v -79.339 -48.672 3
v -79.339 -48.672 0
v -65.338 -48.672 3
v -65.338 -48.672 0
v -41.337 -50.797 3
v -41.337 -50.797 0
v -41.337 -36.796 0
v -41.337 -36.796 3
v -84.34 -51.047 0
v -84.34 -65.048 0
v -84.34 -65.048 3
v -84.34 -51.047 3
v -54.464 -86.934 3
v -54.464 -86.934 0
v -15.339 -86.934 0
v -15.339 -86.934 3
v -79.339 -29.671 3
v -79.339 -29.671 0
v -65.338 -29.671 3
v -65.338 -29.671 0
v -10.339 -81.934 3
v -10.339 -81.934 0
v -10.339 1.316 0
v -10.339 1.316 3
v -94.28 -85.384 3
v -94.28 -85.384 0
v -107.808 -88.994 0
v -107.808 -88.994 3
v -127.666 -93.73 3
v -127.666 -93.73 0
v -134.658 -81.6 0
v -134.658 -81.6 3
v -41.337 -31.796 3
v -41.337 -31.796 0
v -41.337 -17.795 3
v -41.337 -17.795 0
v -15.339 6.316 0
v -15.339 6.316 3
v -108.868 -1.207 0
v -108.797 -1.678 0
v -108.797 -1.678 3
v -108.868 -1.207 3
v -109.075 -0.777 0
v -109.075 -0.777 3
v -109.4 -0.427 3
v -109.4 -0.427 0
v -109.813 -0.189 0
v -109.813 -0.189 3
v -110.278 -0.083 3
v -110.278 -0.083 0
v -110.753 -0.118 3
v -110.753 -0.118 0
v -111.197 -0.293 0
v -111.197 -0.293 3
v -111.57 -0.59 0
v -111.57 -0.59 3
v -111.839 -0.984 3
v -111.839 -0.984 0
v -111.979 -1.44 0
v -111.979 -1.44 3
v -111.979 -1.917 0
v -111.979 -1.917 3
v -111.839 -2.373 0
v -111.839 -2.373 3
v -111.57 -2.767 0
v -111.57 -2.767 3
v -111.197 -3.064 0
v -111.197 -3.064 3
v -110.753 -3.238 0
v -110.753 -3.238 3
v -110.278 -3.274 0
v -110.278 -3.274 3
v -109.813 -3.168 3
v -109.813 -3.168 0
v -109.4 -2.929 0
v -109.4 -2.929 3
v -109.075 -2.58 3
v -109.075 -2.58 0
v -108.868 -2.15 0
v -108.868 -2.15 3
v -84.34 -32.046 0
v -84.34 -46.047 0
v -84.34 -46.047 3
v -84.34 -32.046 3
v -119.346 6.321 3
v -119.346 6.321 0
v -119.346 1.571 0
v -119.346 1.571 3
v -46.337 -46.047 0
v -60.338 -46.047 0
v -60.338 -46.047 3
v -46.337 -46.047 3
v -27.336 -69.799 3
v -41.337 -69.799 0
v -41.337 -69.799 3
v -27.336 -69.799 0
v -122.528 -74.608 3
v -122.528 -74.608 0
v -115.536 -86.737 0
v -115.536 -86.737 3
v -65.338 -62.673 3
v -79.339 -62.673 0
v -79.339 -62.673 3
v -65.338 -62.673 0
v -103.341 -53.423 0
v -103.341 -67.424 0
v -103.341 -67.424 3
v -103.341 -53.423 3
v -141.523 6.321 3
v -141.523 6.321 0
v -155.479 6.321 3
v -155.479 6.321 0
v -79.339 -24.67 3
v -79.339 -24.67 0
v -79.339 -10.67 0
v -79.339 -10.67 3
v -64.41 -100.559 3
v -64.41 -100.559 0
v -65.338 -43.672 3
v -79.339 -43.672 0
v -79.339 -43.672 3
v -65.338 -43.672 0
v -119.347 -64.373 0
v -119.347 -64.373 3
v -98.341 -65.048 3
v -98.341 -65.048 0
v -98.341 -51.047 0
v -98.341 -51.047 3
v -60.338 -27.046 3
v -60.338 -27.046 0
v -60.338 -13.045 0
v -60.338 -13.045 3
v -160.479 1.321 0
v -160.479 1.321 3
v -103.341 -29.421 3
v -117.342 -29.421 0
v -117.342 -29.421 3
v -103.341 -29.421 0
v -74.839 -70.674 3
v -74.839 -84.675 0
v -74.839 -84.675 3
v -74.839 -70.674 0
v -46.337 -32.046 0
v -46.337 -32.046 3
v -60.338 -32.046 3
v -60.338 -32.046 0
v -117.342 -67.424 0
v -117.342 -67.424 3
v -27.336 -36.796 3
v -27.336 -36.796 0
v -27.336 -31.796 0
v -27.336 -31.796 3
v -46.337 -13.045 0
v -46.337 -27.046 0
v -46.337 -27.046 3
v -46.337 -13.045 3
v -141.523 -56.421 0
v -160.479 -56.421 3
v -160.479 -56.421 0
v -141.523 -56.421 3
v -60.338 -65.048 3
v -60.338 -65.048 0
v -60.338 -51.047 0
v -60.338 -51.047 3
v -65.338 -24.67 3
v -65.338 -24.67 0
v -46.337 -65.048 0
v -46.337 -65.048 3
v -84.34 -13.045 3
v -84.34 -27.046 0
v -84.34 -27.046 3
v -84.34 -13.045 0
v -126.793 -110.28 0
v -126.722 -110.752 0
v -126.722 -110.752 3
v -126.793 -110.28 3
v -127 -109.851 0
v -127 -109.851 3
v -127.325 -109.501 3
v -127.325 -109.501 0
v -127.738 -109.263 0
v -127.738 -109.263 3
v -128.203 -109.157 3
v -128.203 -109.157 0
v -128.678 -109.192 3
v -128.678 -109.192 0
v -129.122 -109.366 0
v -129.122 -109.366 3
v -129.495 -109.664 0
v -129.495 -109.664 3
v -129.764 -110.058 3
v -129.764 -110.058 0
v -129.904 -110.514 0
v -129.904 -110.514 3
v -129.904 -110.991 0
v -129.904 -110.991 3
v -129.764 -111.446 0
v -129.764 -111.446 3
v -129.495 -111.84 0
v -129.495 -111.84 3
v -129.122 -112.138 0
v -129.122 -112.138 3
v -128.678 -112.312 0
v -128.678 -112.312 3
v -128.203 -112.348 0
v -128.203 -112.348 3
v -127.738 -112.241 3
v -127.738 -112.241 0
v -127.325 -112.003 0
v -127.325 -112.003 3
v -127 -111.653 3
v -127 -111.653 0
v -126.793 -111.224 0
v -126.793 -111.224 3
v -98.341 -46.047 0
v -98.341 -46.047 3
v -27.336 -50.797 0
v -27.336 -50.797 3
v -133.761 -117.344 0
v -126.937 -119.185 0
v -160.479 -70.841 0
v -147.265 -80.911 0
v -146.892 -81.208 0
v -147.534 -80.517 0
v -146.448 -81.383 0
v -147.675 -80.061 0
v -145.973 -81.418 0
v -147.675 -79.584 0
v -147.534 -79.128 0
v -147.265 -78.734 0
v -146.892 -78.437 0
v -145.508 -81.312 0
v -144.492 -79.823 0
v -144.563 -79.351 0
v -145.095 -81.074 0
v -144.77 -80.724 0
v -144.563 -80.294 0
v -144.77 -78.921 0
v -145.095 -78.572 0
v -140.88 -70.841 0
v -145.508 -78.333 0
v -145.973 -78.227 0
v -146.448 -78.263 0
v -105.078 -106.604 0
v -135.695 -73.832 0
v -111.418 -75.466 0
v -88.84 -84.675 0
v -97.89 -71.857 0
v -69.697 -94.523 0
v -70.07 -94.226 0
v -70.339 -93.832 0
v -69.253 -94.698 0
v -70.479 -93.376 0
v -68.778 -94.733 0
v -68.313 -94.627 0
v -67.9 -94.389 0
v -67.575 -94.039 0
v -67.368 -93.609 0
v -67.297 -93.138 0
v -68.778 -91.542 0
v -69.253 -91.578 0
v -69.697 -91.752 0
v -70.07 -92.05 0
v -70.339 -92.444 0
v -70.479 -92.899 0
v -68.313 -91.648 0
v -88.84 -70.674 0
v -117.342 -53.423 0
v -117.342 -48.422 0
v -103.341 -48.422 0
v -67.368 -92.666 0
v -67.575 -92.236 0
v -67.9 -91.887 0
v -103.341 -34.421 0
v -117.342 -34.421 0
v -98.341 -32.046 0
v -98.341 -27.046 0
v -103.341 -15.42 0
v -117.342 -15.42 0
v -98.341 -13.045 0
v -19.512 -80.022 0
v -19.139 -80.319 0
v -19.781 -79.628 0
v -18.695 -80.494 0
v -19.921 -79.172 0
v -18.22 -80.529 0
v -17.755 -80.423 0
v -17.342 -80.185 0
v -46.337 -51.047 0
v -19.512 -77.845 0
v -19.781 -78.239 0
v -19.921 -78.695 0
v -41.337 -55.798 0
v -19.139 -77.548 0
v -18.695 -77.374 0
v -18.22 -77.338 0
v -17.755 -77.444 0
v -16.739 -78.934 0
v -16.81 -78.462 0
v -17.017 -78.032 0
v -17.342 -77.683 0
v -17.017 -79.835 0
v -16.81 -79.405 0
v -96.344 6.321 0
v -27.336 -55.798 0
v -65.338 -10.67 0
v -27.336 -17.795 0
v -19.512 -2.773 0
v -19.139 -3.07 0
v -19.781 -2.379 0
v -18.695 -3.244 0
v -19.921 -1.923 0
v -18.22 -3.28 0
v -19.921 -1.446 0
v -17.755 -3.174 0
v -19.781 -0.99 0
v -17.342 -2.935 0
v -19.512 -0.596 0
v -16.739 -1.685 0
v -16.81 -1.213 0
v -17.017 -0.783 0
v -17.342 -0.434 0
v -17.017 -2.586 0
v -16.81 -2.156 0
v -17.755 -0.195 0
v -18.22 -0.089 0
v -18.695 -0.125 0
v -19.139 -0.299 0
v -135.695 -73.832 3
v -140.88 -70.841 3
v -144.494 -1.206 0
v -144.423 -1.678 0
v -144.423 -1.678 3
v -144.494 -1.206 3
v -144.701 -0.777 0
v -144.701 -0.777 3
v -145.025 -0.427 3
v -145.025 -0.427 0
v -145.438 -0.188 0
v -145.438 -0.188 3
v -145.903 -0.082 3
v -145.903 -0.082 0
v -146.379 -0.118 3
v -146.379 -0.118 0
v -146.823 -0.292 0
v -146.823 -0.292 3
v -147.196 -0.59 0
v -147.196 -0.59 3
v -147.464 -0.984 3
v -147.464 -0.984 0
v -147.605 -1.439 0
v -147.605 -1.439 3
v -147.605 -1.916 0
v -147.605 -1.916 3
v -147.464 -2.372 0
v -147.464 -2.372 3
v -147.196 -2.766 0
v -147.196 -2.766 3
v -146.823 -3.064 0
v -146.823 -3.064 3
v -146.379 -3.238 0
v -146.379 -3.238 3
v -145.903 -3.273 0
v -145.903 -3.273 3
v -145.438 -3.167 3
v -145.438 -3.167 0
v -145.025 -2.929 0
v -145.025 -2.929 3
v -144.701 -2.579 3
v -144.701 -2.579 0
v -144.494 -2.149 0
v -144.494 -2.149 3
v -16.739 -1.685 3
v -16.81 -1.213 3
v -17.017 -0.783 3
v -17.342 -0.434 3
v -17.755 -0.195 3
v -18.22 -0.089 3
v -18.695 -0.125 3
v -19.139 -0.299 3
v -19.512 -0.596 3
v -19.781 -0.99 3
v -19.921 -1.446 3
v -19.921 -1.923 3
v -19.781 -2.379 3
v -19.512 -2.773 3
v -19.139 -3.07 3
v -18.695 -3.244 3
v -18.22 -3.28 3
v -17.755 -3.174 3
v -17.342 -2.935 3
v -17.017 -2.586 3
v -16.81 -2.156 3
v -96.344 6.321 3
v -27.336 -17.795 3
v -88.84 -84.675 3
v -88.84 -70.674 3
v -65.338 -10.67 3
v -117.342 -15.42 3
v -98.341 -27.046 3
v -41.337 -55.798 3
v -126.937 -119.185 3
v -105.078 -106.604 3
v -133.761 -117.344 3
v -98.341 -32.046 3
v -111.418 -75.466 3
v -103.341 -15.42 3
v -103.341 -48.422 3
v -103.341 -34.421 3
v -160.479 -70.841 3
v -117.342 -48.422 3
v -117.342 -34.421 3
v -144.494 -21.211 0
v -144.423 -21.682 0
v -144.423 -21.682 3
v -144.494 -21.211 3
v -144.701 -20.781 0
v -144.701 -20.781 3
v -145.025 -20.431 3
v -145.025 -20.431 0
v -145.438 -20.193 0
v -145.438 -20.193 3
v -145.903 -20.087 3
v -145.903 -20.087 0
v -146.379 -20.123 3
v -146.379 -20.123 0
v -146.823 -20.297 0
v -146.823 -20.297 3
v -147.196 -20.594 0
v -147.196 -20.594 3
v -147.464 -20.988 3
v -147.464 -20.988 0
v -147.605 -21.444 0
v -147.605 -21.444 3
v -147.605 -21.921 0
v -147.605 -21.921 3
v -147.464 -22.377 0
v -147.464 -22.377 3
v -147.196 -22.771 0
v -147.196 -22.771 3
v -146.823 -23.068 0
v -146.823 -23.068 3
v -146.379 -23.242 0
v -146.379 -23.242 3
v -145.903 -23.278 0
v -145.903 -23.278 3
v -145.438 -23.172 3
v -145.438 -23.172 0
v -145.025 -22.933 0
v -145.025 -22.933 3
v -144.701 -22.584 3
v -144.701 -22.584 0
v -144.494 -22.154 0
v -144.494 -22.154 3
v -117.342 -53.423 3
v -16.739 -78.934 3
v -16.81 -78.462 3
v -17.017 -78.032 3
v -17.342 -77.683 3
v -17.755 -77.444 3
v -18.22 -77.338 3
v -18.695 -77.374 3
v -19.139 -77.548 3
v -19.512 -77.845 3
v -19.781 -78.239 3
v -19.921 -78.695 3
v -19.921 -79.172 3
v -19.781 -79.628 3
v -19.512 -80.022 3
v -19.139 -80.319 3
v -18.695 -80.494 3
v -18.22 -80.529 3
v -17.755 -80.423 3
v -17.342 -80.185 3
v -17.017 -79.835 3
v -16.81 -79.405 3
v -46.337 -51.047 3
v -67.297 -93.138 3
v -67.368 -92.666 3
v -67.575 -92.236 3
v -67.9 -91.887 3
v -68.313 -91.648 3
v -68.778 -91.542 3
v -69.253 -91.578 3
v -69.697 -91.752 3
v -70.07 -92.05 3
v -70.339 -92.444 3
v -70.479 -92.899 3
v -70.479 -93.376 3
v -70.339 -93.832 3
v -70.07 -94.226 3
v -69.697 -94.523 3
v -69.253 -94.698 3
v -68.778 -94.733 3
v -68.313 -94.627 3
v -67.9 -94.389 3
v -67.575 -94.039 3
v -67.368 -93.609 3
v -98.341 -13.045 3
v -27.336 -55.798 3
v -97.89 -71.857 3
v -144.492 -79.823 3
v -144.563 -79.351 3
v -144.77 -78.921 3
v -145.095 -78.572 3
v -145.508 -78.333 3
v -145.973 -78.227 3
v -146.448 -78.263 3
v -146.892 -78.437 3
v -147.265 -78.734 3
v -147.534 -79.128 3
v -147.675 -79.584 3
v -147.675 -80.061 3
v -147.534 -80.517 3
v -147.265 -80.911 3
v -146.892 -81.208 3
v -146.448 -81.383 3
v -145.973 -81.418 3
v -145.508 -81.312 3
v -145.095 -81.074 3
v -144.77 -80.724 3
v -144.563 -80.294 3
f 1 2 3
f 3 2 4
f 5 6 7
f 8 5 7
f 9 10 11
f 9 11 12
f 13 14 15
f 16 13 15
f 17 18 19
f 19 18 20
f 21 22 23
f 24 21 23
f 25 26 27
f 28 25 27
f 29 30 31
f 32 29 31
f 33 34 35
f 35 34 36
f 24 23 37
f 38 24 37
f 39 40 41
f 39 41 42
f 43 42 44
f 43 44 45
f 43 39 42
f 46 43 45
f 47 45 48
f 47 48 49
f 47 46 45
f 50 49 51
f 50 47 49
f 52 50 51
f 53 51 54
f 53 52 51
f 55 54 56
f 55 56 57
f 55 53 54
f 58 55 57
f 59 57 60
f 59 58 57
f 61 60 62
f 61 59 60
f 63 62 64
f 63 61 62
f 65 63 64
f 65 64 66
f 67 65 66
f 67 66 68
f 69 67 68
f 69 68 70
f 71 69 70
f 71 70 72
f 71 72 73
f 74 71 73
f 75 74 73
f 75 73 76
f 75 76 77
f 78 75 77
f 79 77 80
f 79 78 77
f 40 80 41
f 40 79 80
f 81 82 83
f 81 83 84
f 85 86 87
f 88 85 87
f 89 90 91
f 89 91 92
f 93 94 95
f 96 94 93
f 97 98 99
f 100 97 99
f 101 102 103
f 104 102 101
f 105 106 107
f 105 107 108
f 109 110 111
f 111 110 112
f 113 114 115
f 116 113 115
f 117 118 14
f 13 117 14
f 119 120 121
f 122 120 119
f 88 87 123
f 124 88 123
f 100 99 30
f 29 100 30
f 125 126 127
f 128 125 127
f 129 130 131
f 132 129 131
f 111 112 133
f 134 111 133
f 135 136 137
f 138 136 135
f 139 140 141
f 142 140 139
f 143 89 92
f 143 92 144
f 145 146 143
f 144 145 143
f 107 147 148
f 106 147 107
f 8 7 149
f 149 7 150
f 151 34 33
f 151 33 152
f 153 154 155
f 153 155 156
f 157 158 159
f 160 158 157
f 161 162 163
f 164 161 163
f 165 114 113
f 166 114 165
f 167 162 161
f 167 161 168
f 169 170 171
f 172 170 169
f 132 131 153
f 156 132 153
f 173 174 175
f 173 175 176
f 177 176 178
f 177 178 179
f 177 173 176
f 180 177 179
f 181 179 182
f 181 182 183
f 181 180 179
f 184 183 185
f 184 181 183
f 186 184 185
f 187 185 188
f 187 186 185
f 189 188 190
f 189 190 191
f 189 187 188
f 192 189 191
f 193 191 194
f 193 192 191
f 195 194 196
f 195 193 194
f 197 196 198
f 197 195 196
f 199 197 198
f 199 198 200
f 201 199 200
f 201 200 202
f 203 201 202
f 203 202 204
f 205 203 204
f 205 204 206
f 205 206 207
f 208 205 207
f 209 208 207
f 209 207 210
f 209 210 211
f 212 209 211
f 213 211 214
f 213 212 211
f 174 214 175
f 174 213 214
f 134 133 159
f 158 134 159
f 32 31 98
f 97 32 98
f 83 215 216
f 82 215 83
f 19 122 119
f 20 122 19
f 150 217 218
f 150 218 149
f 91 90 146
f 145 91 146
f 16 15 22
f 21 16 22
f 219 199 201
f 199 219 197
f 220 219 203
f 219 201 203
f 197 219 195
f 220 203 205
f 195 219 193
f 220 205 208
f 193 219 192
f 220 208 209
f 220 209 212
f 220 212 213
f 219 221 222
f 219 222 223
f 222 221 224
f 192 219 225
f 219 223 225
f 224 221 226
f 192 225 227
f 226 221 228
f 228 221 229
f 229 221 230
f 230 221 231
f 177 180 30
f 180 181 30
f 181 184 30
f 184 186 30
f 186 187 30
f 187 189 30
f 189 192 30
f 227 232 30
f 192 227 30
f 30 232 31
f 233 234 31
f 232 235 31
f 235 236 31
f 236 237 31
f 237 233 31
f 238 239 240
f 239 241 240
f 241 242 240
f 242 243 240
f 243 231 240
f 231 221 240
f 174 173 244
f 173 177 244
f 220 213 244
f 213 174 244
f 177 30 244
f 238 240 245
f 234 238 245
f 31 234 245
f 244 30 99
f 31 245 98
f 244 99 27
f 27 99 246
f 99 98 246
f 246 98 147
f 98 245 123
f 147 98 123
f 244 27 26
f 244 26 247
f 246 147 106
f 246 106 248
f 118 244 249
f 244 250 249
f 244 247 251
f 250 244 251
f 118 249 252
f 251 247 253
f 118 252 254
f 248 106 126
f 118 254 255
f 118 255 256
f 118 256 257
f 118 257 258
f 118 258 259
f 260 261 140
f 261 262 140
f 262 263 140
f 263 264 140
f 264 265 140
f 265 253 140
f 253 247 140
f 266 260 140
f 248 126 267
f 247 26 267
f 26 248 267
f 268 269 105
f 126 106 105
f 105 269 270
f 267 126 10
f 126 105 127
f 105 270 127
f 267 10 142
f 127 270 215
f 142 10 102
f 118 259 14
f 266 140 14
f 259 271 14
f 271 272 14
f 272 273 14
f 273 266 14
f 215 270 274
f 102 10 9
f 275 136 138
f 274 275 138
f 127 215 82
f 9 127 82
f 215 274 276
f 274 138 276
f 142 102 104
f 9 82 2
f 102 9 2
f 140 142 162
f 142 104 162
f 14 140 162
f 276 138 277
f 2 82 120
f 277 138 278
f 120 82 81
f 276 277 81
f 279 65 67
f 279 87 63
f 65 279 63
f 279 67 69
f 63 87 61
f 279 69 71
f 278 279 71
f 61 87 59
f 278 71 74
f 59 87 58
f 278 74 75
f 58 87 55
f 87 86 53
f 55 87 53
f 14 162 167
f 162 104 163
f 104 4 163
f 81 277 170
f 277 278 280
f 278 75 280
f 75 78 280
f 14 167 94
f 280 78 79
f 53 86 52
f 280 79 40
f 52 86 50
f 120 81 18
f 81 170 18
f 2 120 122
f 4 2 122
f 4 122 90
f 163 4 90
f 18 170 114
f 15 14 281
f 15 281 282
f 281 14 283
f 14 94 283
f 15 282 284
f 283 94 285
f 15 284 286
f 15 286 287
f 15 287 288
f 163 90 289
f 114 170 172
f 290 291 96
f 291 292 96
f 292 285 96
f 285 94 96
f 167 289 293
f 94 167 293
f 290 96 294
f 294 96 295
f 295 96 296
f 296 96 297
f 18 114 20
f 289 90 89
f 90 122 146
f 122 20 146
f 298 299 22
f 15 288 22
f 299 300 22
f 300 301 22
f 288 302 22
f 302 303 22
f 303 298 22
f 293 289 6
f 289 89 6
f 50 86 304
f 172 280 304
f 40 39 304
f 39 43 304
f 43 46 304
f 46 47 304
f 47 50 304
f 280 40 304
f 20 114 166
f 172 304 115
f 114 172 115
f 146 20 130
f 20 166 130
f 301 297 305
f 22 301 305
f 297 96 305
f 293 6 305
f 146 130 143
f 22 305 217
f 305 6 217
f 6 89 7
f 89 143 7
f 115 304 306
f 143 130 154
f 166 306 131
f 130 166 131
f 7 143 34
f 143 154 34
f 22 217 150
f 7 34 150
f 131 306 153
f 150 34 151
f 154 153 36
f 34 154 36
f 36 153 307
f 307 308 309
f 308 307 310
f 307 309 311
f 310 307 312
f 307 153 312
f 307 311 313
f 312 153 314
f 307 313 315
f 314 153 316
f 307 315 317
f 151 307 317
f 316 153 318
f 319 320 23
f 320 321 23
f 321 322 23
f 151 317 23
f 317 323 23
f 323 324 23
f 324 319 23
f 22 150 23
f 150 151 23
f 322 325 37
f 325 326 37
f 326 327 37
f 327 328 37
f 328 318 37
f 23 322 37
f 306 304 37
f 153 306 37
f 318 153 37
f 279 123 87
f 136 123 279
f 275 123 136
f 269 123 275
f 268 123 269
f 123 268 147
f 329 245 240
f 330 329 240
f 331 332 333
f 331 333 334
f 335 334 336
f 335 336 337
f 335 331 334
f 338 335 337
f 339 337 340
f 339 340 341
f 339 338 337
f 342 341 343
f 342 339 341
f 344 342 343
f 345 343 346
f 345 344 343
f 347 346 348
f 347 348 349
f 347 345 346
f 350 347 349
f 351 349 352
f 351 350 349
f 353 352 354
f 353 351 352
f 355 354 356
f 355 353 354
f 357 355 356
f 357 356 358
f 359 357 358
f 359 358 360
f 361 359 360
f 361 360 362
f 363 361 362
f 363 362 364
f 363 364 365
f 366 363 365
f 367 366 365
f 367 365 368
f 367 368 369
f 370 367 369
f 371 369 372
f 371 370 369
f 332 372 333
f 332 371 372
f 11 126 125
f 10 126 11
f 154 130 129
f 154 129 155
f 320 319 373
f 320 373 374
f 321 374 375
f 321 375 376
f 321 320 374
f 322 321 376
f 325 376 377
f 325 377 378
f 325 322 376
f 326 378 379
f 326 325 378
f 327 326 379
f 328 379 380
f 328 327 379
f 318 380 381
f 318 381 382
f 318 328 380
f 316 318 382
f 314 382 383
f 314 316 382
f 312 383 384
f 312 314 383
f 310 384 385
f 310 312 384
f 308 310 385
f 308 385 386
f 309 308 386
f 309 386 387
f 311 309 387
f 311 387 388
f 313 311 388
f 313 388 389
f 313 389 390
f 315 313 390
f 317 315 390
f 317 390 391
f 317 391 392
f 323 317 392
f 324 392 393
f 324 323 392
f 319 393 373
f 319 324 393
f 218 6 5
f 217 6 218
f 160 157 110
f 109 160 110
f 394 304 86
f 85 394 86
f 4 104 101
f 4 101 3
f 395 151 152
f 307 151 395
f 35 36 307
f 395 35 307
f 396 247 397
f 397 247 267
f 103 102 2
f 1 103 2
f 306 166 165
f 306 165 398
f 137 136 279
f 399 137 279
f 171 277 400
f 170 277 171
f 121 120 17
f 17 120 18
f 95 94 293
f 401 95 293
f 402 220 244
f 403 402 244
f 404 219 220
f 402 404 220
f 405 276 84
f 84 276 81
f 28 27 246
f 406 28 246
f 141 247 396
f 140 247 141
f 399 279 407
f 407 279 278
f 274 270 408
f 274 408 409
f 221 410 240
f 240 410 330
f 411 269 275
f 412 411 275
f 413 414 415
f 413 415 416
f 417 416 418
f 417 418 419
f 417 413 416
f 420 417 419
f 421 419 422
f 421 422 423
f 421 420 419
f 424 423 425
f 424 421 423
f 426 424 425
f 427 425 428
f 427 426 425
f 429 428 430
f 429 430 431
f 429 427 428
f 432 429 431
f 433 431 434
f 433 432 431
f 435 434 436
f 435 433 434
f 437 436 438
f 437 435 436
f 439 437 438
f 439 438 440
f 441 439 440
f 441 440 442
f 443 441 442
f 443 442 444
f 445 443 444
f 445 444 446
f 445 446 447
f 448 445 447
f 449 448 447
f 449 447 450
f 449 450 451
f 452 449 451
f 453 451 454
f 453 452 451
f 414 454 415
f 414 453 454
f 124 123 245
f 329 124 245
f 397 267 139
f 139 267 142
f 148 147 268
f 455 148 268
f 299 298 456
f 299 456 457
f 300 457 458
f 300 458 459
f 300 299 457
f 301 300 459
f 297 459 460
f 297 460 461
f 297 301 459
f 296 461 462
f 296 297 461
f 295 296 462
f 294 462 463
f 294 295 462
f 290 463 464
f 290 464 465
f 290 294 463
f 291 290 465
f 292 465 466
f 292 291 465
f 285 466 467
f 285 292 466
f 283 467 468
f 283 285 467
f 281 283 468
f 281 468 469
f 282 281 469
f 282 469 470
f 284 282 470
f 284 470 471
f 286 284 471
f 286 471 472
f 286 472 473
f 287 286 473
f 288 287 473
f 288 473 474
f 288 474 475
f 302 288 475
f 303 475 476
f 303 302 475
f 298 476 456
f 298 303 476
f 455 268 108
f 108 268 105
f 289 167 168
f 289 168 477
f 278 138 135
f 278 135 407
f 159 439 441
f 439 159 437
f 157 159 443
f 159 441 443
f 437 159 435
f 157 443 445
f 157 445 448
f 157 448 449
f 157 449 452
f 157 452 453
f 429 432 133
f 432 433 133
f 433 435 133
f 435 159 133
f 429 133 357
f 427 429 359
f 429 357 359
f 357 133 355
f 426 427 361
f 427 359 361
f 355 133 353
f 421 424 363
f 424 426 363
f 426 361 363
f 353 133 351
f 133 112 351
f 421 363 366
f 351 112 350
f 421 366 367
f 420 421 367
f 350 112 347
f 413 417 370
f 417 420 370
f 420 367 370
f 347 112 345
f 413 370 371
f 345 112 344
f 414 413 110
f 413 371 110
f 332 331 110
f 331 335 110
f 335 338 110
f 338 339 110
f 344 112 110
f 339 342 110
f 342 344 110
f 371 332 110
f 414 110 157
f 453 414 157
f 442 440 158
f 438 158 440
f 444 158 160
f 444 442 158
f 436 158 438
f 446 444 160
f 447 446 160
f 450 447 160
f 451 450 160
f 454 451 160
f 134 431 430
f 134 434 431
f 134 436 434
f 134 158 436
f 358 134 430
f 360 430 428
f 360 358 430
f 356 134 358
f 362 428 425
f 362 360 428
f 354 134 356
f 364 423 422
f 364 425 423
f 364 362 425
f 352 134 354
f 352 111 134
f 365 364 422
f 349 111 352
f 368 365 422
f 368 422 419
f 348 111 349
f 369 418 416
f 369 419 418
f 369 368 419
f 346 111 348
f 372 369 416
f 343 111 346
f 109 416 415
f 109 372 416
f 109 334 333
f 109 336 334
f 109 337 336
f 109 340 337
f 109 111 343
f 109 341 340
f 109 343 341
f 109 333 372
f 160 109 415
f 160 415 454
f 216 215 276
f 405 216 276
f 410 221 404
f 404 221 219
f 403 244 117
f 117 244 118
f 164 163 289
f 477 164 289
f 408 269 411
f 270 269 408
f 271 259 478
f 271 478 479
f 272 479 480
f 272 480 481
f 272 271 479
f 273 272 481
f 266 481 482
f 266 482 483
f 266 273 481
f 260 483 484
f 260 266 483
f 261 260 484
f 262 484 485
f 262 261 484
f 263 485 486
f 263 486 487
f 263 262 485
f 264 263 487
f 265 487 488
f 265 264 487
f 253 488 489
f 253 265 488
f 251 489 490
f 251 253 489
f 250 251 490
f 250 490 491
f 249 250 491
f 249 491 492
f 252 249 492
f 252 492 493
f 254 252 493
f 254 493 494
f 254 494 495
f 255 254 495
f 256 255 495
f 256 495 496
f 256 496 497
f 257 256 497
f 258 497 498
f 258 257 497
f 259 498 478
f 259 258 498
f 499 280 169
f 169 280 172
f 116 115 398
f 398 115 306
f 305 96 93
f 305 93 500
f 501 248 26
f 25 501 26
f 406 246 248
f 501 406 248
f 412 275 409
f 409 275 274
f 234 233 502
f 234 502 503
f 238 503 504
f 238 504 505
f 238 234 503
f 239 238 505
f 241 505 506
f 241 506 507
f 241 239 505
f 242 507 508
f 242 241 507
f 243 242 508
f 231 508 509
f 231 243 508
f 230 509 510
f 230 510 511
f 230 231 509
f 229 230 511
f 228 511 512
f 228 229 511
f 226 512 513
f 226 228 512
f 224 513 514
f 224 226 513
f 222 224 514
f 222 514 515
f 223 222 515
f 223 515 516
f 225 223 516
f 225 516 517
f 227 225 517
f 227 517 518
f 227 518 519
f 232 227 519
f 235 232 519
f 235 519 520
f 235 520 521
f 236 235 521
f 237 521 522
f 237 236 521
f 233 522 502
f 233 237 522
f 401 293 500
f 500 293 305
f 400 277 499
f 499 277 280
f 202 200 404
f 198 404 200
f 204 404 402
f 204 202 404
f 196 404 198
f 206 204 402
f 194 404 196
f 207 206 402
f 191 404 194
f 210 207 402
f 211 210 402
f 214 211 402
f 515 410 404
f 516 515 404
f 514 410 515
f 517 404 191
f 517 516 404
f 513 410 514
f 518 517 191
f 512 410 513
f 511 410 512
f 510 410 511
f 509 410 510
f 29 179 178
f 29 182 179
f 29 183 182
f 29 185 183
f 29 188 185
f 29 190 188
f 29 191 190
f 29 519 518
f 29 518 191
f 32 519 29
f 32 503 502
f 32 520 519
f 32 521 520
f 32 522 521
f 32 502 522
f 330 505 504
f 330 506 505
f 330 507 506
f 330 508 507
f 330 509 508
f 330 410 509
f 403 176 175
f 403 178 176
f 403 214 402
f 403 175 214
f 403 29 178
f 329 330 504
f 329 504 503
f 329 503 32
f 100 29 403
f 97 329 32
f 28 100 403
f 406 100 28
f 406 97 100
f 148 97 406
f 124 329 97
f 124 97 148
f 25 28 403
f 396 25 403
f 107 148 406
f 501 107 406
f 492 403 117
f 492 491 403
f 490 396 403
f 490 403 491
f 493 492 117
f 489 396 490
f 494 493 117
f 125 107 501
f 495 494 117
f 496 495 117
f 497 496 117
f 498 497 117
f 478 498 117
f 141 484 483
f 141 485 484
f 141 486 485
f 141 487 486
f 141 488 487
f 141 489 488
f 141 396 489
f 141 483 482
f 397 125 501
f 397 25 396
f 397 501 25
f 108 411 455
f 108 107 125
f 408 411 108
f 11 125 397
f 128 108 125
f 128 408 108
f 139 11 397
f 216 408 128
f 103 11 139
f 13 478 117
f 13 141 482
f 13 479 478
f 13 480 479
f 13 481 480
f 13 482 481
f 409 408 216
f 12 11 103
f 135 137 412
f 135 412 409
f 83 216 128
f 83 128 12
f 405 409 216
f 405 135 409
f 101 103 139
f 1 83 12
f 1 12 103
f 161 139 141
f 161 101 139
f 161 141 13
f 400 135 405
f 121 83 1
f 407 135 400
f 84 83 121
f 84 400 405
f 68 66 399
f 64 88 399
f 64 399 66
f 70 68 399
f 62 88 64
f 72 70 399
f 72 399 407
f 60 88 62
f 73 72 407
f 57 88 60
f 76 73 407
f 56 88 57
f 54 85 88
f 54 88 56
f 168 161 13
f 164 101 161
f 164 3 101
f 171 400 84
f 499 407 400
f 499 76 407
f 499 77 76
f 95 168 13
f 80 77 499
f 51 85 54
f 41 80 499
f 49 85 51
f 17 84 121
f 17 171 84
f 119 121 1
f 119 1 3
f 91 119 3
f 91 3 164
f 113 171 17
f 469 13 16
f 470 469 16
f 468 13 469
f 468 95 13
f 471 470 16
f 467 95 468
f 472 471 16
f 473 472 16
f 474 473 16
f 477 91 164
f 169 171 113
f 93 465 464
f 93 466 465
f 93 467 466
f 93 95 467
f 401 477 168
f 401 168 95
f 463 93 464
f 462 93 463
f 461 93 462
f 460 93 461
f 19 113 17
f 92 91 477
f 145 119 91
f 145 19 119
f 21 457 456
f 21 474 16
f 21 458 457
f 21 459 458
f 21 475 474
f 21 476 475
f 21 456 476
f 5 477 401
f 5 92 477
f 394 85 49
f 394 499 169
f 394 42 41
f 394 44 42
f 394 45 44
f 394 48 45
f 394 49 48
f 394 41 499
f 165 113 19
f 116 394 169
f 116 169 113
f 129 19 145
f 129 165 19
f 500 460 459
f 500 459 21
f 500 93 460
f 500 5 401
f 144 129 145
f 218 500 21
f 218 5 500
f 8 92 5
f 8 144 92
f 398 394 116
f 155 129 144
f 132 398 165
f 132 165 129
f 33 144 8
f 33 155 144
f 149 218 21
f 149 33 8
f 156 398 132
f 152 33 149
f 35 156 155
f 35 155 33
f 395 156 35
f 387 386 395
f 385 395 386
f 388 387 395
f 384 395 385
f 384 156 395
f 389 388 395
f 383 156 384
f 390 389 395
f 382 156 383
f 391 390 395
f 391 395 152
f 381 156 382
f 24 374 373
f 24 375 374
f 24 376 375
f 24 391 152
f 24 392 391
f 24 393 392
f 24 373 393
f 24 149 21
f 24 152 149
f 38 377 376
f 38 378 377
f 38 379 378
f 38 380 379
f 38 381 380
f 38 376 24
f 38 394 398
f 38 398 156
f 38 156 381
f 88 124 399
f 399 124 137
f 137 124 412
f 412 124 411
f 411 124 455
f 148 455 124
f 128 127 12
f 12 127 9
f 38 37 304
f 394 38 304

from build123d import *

# Parameters (mm, degrees)
SWITCHPLATE_R           = 1.6
SWITCHPLATE_W           = 14.000982373
SWITCHPLATE_H           = 14.000982374
SWITCHPLATE_H_2         = 14.000982373
SWITCHPLATE_W_2         = 14.000982374
BOSS_EXTRU_2_DEPTH      = 3
ESQUISSE1_W             = 20.456160795
ESQUISSE1_H             = 14.420470361
ENL_V_MAT_EXTRU_1_DEPTH = 10


with BuildPart() as part:
    # Switchplate → Boss.-Extru.2 (new body)
    with BuildSketch(Plane.XY):
        Polygon((-160.478985875, -70.841138967), (-133.761270027, -117.344044002), (-126.936961278, -119.18521524), (-105.07834936, -106.603969177), (-64.409664562, -100.558603138), (-54.463628843, -86.933633781), (-15.339106902, -86.933633781), (-10.339106902, -81.933633781), (-10.339106902, 1.31606909), (-15.339106894, 6.316347179), (-96.344426674, 6.320852512), (-103.340940531, 6.320852512), (-119.346315028, 6.320852512), (-119.346315028, 1.570515597), (-119.346630506, -64.372807463), (-135.694988334, -73.831500172), (-141.52282508, -70.47035259), (-141.52282508, 1.570515597), (-141.52282508, 6.320852512), (-155.478985875, 6.320852512), (-160.478985875, 1.320852512), (-160.478985875, -3.429484403), align=None)
        with Locations((-18.339106961, -1.684542717)):
            Circle(SWITCHPLATE_R, mode=Mode.SUBTRACT)
        with Locations((-110.397084988, -1.678365923)):
            Circle(SWITCHPLATE_R, mode=Mode.SUBTRACT)
        with Locations((-18.339106961, -78.933633781)):
            Circle(SWITCHPLATE_R, mode=Mode.SUBTRACT)
        with Locations((-68.897334865, -93.137788223)):
            Circle(SWITCHPLATE_R, mode=Mode.SUBTRACT)
        with Locations((-128.322250168, -110.752044388)):
            Circle(SWITCHPLATE_R, mode=Mode.SUBTRACT)
        with Locations((-146.0923789, -79.822656053)):
            Circle(SWITCHPLATE_R, mode=Mode.SUBTRACT)
        with Locations((-146.02282508, -1.677868186)):
            Circle(SWITCHPLATE_R, mode=Mode.SUBTRACT)
        with Locations((-146.02282508, -21.682390047)):
            Circle(SWITCHPLATE_R, mode=Mode.SUBTRACT)
        with Locations((-110.341431718, -22.42033468)):
            Rectangle(SWITCHPLATE_W, SWITCHPLATE_H, mode=Mode.SUBTRACT)
        with Locations((-91.340084057, -20.045166224)):
            Rectangle(SWITCHPLATE_W, SWITCHPLATE_H_2, mode=Mode.SUBTRACT)
        with Locations((-72.338736396, -17.669997767)):
            Rectangle(SWITCHPLATE_W_2, SWITCHPLATE_H, mode=Mode.SUBTRACT)
        with Locations((-53.337388735, -20.045166225)):
            Rectangle(SWITCHPLATE_W_2, SWITCHPLATE_H, mode=Mode.SUBTRACT)
        with Locations((-34.336041075, -24.795503141)):
            Rectangle(SWITCHPLATE_W_2, SWITCHPLATE_H, mode=Mode.SUBTRACT)
        with Locations((-110.341431718, -41.421682341)):
            Rectangle(SWITCHPLATE_W_2, SWITCHPLATE_H, mode=Mode.SUBTRACT)
        with Locations((-91.340084058, -39.046513884)):
            Rectangle(SWITCHPLATE_W, SWITCHPLATE_H, mode=Mode.SUBTRACT)
        with Locations((-72.338736397, -36.671345428)):
            Rectangle(SWITCHPLATE_W_2, SWITCHPLATE_H_2, mode=Mode.SUBTRACT)
        with Locations((-53.337388736, -39.046513886)):
            Rectangle(SWITCHPLATE_W_2, SWITCHPLATE_H, mode=Mode.SUBTRACT)
        with Locations((-34.336041076, -43.796850802)):
            Rectangle(SWITCHPLATE_W, SWITCHPLATE_H, mode=Mode.SUBTRACT)
        with Locations((-34.336041077, -62.798198463)):
            Rectangle(SWITCHPLATE_W, SWITCHPLATE_H, mode=Mode.SUBTRACT)
        with Locations((-53.337388737, -58.047861547)):
            Rectangle(SWITCHPLATE_W_2, SWITCHPLATE_H, mode=Mode.SUBTRACT)
        with Locations((-72.338736397, -55.672693088)):
            Rectangle(SWITCHPLATE_W, SWITCHPLATE_H, mode=Mode.SUBTRACT)
        with Locations((-91.340084058, -58.047861545)):
            Rectangle(SWITCHPLATE_W_2, SWITCHPLATE_H, mode=Mode.SUBTRACT)
        with Locations((-110.341431719, -60.423030002)):
            Rectangle(SWITCHPLATE_W_2, SWITCHPLATE_H, mode=Mode.SUBTRACT)
        with Locations((-81.839410229, -77.674253537)):
            Rectangle(SWITCHPLATE_W_2, SWITCHPLATE_H, mode=Mode.SUBTRACT)
        Polygon((-111.417520933, -75.466480675), (-97.889935794, -71.856501764), (-94.279956882, -85.384086902), (-107.807542021, -88.994065814), align=None, mode=Mode.SUBTRACT)
        Polygon((-134.658112592, -81.599723585), (-122.528132256, -74.607507592), (-115.535916264, -86.737487928), (-127.665896599, -93.729703921), align=None, mode=Mode.SUBTRACT)
    extrude(amount=BOSS_EXTRU_2_DEPTH)

    # Esquisse1 → Enlèv. mat.-Extru.1 (cut)
    with BuildSketch(Plane.XY.offset(3)):
        with Locations((-150.250905477, -63.630903787)):
            Rectangle(ESQUISSE1_W, ESQUISSE1_H)
    extrude(amount=-ENL_V_MAT_EXTRU_1_DEPTH, mode=Mode.SUBTRACT)


with BuildPart() as enl_v_mat_extru_1_piece_1:
    # of the separate pieces the step leaves, piece 1, a body of its own (enl_v_mat_extru_1_pieces)
    add(part.part.solids().sort_by_distance((-160.478985875, -70.841138967, 0))[0])


with BuildPart() as enl_v_mat_extru_1_piece_2:
    # of the separate pieces the step leaves, piece 2, a body of its own (enl_v_mat_extru_1_pieces)
    add(part.part.solids().sort_by_distance((-160.478985875, 1.320852512, 0))[0])


solid = Compound([enl_v_mat_extru_1_piece_1.part, enl_v_mat_extru_1_piece_2.part])
